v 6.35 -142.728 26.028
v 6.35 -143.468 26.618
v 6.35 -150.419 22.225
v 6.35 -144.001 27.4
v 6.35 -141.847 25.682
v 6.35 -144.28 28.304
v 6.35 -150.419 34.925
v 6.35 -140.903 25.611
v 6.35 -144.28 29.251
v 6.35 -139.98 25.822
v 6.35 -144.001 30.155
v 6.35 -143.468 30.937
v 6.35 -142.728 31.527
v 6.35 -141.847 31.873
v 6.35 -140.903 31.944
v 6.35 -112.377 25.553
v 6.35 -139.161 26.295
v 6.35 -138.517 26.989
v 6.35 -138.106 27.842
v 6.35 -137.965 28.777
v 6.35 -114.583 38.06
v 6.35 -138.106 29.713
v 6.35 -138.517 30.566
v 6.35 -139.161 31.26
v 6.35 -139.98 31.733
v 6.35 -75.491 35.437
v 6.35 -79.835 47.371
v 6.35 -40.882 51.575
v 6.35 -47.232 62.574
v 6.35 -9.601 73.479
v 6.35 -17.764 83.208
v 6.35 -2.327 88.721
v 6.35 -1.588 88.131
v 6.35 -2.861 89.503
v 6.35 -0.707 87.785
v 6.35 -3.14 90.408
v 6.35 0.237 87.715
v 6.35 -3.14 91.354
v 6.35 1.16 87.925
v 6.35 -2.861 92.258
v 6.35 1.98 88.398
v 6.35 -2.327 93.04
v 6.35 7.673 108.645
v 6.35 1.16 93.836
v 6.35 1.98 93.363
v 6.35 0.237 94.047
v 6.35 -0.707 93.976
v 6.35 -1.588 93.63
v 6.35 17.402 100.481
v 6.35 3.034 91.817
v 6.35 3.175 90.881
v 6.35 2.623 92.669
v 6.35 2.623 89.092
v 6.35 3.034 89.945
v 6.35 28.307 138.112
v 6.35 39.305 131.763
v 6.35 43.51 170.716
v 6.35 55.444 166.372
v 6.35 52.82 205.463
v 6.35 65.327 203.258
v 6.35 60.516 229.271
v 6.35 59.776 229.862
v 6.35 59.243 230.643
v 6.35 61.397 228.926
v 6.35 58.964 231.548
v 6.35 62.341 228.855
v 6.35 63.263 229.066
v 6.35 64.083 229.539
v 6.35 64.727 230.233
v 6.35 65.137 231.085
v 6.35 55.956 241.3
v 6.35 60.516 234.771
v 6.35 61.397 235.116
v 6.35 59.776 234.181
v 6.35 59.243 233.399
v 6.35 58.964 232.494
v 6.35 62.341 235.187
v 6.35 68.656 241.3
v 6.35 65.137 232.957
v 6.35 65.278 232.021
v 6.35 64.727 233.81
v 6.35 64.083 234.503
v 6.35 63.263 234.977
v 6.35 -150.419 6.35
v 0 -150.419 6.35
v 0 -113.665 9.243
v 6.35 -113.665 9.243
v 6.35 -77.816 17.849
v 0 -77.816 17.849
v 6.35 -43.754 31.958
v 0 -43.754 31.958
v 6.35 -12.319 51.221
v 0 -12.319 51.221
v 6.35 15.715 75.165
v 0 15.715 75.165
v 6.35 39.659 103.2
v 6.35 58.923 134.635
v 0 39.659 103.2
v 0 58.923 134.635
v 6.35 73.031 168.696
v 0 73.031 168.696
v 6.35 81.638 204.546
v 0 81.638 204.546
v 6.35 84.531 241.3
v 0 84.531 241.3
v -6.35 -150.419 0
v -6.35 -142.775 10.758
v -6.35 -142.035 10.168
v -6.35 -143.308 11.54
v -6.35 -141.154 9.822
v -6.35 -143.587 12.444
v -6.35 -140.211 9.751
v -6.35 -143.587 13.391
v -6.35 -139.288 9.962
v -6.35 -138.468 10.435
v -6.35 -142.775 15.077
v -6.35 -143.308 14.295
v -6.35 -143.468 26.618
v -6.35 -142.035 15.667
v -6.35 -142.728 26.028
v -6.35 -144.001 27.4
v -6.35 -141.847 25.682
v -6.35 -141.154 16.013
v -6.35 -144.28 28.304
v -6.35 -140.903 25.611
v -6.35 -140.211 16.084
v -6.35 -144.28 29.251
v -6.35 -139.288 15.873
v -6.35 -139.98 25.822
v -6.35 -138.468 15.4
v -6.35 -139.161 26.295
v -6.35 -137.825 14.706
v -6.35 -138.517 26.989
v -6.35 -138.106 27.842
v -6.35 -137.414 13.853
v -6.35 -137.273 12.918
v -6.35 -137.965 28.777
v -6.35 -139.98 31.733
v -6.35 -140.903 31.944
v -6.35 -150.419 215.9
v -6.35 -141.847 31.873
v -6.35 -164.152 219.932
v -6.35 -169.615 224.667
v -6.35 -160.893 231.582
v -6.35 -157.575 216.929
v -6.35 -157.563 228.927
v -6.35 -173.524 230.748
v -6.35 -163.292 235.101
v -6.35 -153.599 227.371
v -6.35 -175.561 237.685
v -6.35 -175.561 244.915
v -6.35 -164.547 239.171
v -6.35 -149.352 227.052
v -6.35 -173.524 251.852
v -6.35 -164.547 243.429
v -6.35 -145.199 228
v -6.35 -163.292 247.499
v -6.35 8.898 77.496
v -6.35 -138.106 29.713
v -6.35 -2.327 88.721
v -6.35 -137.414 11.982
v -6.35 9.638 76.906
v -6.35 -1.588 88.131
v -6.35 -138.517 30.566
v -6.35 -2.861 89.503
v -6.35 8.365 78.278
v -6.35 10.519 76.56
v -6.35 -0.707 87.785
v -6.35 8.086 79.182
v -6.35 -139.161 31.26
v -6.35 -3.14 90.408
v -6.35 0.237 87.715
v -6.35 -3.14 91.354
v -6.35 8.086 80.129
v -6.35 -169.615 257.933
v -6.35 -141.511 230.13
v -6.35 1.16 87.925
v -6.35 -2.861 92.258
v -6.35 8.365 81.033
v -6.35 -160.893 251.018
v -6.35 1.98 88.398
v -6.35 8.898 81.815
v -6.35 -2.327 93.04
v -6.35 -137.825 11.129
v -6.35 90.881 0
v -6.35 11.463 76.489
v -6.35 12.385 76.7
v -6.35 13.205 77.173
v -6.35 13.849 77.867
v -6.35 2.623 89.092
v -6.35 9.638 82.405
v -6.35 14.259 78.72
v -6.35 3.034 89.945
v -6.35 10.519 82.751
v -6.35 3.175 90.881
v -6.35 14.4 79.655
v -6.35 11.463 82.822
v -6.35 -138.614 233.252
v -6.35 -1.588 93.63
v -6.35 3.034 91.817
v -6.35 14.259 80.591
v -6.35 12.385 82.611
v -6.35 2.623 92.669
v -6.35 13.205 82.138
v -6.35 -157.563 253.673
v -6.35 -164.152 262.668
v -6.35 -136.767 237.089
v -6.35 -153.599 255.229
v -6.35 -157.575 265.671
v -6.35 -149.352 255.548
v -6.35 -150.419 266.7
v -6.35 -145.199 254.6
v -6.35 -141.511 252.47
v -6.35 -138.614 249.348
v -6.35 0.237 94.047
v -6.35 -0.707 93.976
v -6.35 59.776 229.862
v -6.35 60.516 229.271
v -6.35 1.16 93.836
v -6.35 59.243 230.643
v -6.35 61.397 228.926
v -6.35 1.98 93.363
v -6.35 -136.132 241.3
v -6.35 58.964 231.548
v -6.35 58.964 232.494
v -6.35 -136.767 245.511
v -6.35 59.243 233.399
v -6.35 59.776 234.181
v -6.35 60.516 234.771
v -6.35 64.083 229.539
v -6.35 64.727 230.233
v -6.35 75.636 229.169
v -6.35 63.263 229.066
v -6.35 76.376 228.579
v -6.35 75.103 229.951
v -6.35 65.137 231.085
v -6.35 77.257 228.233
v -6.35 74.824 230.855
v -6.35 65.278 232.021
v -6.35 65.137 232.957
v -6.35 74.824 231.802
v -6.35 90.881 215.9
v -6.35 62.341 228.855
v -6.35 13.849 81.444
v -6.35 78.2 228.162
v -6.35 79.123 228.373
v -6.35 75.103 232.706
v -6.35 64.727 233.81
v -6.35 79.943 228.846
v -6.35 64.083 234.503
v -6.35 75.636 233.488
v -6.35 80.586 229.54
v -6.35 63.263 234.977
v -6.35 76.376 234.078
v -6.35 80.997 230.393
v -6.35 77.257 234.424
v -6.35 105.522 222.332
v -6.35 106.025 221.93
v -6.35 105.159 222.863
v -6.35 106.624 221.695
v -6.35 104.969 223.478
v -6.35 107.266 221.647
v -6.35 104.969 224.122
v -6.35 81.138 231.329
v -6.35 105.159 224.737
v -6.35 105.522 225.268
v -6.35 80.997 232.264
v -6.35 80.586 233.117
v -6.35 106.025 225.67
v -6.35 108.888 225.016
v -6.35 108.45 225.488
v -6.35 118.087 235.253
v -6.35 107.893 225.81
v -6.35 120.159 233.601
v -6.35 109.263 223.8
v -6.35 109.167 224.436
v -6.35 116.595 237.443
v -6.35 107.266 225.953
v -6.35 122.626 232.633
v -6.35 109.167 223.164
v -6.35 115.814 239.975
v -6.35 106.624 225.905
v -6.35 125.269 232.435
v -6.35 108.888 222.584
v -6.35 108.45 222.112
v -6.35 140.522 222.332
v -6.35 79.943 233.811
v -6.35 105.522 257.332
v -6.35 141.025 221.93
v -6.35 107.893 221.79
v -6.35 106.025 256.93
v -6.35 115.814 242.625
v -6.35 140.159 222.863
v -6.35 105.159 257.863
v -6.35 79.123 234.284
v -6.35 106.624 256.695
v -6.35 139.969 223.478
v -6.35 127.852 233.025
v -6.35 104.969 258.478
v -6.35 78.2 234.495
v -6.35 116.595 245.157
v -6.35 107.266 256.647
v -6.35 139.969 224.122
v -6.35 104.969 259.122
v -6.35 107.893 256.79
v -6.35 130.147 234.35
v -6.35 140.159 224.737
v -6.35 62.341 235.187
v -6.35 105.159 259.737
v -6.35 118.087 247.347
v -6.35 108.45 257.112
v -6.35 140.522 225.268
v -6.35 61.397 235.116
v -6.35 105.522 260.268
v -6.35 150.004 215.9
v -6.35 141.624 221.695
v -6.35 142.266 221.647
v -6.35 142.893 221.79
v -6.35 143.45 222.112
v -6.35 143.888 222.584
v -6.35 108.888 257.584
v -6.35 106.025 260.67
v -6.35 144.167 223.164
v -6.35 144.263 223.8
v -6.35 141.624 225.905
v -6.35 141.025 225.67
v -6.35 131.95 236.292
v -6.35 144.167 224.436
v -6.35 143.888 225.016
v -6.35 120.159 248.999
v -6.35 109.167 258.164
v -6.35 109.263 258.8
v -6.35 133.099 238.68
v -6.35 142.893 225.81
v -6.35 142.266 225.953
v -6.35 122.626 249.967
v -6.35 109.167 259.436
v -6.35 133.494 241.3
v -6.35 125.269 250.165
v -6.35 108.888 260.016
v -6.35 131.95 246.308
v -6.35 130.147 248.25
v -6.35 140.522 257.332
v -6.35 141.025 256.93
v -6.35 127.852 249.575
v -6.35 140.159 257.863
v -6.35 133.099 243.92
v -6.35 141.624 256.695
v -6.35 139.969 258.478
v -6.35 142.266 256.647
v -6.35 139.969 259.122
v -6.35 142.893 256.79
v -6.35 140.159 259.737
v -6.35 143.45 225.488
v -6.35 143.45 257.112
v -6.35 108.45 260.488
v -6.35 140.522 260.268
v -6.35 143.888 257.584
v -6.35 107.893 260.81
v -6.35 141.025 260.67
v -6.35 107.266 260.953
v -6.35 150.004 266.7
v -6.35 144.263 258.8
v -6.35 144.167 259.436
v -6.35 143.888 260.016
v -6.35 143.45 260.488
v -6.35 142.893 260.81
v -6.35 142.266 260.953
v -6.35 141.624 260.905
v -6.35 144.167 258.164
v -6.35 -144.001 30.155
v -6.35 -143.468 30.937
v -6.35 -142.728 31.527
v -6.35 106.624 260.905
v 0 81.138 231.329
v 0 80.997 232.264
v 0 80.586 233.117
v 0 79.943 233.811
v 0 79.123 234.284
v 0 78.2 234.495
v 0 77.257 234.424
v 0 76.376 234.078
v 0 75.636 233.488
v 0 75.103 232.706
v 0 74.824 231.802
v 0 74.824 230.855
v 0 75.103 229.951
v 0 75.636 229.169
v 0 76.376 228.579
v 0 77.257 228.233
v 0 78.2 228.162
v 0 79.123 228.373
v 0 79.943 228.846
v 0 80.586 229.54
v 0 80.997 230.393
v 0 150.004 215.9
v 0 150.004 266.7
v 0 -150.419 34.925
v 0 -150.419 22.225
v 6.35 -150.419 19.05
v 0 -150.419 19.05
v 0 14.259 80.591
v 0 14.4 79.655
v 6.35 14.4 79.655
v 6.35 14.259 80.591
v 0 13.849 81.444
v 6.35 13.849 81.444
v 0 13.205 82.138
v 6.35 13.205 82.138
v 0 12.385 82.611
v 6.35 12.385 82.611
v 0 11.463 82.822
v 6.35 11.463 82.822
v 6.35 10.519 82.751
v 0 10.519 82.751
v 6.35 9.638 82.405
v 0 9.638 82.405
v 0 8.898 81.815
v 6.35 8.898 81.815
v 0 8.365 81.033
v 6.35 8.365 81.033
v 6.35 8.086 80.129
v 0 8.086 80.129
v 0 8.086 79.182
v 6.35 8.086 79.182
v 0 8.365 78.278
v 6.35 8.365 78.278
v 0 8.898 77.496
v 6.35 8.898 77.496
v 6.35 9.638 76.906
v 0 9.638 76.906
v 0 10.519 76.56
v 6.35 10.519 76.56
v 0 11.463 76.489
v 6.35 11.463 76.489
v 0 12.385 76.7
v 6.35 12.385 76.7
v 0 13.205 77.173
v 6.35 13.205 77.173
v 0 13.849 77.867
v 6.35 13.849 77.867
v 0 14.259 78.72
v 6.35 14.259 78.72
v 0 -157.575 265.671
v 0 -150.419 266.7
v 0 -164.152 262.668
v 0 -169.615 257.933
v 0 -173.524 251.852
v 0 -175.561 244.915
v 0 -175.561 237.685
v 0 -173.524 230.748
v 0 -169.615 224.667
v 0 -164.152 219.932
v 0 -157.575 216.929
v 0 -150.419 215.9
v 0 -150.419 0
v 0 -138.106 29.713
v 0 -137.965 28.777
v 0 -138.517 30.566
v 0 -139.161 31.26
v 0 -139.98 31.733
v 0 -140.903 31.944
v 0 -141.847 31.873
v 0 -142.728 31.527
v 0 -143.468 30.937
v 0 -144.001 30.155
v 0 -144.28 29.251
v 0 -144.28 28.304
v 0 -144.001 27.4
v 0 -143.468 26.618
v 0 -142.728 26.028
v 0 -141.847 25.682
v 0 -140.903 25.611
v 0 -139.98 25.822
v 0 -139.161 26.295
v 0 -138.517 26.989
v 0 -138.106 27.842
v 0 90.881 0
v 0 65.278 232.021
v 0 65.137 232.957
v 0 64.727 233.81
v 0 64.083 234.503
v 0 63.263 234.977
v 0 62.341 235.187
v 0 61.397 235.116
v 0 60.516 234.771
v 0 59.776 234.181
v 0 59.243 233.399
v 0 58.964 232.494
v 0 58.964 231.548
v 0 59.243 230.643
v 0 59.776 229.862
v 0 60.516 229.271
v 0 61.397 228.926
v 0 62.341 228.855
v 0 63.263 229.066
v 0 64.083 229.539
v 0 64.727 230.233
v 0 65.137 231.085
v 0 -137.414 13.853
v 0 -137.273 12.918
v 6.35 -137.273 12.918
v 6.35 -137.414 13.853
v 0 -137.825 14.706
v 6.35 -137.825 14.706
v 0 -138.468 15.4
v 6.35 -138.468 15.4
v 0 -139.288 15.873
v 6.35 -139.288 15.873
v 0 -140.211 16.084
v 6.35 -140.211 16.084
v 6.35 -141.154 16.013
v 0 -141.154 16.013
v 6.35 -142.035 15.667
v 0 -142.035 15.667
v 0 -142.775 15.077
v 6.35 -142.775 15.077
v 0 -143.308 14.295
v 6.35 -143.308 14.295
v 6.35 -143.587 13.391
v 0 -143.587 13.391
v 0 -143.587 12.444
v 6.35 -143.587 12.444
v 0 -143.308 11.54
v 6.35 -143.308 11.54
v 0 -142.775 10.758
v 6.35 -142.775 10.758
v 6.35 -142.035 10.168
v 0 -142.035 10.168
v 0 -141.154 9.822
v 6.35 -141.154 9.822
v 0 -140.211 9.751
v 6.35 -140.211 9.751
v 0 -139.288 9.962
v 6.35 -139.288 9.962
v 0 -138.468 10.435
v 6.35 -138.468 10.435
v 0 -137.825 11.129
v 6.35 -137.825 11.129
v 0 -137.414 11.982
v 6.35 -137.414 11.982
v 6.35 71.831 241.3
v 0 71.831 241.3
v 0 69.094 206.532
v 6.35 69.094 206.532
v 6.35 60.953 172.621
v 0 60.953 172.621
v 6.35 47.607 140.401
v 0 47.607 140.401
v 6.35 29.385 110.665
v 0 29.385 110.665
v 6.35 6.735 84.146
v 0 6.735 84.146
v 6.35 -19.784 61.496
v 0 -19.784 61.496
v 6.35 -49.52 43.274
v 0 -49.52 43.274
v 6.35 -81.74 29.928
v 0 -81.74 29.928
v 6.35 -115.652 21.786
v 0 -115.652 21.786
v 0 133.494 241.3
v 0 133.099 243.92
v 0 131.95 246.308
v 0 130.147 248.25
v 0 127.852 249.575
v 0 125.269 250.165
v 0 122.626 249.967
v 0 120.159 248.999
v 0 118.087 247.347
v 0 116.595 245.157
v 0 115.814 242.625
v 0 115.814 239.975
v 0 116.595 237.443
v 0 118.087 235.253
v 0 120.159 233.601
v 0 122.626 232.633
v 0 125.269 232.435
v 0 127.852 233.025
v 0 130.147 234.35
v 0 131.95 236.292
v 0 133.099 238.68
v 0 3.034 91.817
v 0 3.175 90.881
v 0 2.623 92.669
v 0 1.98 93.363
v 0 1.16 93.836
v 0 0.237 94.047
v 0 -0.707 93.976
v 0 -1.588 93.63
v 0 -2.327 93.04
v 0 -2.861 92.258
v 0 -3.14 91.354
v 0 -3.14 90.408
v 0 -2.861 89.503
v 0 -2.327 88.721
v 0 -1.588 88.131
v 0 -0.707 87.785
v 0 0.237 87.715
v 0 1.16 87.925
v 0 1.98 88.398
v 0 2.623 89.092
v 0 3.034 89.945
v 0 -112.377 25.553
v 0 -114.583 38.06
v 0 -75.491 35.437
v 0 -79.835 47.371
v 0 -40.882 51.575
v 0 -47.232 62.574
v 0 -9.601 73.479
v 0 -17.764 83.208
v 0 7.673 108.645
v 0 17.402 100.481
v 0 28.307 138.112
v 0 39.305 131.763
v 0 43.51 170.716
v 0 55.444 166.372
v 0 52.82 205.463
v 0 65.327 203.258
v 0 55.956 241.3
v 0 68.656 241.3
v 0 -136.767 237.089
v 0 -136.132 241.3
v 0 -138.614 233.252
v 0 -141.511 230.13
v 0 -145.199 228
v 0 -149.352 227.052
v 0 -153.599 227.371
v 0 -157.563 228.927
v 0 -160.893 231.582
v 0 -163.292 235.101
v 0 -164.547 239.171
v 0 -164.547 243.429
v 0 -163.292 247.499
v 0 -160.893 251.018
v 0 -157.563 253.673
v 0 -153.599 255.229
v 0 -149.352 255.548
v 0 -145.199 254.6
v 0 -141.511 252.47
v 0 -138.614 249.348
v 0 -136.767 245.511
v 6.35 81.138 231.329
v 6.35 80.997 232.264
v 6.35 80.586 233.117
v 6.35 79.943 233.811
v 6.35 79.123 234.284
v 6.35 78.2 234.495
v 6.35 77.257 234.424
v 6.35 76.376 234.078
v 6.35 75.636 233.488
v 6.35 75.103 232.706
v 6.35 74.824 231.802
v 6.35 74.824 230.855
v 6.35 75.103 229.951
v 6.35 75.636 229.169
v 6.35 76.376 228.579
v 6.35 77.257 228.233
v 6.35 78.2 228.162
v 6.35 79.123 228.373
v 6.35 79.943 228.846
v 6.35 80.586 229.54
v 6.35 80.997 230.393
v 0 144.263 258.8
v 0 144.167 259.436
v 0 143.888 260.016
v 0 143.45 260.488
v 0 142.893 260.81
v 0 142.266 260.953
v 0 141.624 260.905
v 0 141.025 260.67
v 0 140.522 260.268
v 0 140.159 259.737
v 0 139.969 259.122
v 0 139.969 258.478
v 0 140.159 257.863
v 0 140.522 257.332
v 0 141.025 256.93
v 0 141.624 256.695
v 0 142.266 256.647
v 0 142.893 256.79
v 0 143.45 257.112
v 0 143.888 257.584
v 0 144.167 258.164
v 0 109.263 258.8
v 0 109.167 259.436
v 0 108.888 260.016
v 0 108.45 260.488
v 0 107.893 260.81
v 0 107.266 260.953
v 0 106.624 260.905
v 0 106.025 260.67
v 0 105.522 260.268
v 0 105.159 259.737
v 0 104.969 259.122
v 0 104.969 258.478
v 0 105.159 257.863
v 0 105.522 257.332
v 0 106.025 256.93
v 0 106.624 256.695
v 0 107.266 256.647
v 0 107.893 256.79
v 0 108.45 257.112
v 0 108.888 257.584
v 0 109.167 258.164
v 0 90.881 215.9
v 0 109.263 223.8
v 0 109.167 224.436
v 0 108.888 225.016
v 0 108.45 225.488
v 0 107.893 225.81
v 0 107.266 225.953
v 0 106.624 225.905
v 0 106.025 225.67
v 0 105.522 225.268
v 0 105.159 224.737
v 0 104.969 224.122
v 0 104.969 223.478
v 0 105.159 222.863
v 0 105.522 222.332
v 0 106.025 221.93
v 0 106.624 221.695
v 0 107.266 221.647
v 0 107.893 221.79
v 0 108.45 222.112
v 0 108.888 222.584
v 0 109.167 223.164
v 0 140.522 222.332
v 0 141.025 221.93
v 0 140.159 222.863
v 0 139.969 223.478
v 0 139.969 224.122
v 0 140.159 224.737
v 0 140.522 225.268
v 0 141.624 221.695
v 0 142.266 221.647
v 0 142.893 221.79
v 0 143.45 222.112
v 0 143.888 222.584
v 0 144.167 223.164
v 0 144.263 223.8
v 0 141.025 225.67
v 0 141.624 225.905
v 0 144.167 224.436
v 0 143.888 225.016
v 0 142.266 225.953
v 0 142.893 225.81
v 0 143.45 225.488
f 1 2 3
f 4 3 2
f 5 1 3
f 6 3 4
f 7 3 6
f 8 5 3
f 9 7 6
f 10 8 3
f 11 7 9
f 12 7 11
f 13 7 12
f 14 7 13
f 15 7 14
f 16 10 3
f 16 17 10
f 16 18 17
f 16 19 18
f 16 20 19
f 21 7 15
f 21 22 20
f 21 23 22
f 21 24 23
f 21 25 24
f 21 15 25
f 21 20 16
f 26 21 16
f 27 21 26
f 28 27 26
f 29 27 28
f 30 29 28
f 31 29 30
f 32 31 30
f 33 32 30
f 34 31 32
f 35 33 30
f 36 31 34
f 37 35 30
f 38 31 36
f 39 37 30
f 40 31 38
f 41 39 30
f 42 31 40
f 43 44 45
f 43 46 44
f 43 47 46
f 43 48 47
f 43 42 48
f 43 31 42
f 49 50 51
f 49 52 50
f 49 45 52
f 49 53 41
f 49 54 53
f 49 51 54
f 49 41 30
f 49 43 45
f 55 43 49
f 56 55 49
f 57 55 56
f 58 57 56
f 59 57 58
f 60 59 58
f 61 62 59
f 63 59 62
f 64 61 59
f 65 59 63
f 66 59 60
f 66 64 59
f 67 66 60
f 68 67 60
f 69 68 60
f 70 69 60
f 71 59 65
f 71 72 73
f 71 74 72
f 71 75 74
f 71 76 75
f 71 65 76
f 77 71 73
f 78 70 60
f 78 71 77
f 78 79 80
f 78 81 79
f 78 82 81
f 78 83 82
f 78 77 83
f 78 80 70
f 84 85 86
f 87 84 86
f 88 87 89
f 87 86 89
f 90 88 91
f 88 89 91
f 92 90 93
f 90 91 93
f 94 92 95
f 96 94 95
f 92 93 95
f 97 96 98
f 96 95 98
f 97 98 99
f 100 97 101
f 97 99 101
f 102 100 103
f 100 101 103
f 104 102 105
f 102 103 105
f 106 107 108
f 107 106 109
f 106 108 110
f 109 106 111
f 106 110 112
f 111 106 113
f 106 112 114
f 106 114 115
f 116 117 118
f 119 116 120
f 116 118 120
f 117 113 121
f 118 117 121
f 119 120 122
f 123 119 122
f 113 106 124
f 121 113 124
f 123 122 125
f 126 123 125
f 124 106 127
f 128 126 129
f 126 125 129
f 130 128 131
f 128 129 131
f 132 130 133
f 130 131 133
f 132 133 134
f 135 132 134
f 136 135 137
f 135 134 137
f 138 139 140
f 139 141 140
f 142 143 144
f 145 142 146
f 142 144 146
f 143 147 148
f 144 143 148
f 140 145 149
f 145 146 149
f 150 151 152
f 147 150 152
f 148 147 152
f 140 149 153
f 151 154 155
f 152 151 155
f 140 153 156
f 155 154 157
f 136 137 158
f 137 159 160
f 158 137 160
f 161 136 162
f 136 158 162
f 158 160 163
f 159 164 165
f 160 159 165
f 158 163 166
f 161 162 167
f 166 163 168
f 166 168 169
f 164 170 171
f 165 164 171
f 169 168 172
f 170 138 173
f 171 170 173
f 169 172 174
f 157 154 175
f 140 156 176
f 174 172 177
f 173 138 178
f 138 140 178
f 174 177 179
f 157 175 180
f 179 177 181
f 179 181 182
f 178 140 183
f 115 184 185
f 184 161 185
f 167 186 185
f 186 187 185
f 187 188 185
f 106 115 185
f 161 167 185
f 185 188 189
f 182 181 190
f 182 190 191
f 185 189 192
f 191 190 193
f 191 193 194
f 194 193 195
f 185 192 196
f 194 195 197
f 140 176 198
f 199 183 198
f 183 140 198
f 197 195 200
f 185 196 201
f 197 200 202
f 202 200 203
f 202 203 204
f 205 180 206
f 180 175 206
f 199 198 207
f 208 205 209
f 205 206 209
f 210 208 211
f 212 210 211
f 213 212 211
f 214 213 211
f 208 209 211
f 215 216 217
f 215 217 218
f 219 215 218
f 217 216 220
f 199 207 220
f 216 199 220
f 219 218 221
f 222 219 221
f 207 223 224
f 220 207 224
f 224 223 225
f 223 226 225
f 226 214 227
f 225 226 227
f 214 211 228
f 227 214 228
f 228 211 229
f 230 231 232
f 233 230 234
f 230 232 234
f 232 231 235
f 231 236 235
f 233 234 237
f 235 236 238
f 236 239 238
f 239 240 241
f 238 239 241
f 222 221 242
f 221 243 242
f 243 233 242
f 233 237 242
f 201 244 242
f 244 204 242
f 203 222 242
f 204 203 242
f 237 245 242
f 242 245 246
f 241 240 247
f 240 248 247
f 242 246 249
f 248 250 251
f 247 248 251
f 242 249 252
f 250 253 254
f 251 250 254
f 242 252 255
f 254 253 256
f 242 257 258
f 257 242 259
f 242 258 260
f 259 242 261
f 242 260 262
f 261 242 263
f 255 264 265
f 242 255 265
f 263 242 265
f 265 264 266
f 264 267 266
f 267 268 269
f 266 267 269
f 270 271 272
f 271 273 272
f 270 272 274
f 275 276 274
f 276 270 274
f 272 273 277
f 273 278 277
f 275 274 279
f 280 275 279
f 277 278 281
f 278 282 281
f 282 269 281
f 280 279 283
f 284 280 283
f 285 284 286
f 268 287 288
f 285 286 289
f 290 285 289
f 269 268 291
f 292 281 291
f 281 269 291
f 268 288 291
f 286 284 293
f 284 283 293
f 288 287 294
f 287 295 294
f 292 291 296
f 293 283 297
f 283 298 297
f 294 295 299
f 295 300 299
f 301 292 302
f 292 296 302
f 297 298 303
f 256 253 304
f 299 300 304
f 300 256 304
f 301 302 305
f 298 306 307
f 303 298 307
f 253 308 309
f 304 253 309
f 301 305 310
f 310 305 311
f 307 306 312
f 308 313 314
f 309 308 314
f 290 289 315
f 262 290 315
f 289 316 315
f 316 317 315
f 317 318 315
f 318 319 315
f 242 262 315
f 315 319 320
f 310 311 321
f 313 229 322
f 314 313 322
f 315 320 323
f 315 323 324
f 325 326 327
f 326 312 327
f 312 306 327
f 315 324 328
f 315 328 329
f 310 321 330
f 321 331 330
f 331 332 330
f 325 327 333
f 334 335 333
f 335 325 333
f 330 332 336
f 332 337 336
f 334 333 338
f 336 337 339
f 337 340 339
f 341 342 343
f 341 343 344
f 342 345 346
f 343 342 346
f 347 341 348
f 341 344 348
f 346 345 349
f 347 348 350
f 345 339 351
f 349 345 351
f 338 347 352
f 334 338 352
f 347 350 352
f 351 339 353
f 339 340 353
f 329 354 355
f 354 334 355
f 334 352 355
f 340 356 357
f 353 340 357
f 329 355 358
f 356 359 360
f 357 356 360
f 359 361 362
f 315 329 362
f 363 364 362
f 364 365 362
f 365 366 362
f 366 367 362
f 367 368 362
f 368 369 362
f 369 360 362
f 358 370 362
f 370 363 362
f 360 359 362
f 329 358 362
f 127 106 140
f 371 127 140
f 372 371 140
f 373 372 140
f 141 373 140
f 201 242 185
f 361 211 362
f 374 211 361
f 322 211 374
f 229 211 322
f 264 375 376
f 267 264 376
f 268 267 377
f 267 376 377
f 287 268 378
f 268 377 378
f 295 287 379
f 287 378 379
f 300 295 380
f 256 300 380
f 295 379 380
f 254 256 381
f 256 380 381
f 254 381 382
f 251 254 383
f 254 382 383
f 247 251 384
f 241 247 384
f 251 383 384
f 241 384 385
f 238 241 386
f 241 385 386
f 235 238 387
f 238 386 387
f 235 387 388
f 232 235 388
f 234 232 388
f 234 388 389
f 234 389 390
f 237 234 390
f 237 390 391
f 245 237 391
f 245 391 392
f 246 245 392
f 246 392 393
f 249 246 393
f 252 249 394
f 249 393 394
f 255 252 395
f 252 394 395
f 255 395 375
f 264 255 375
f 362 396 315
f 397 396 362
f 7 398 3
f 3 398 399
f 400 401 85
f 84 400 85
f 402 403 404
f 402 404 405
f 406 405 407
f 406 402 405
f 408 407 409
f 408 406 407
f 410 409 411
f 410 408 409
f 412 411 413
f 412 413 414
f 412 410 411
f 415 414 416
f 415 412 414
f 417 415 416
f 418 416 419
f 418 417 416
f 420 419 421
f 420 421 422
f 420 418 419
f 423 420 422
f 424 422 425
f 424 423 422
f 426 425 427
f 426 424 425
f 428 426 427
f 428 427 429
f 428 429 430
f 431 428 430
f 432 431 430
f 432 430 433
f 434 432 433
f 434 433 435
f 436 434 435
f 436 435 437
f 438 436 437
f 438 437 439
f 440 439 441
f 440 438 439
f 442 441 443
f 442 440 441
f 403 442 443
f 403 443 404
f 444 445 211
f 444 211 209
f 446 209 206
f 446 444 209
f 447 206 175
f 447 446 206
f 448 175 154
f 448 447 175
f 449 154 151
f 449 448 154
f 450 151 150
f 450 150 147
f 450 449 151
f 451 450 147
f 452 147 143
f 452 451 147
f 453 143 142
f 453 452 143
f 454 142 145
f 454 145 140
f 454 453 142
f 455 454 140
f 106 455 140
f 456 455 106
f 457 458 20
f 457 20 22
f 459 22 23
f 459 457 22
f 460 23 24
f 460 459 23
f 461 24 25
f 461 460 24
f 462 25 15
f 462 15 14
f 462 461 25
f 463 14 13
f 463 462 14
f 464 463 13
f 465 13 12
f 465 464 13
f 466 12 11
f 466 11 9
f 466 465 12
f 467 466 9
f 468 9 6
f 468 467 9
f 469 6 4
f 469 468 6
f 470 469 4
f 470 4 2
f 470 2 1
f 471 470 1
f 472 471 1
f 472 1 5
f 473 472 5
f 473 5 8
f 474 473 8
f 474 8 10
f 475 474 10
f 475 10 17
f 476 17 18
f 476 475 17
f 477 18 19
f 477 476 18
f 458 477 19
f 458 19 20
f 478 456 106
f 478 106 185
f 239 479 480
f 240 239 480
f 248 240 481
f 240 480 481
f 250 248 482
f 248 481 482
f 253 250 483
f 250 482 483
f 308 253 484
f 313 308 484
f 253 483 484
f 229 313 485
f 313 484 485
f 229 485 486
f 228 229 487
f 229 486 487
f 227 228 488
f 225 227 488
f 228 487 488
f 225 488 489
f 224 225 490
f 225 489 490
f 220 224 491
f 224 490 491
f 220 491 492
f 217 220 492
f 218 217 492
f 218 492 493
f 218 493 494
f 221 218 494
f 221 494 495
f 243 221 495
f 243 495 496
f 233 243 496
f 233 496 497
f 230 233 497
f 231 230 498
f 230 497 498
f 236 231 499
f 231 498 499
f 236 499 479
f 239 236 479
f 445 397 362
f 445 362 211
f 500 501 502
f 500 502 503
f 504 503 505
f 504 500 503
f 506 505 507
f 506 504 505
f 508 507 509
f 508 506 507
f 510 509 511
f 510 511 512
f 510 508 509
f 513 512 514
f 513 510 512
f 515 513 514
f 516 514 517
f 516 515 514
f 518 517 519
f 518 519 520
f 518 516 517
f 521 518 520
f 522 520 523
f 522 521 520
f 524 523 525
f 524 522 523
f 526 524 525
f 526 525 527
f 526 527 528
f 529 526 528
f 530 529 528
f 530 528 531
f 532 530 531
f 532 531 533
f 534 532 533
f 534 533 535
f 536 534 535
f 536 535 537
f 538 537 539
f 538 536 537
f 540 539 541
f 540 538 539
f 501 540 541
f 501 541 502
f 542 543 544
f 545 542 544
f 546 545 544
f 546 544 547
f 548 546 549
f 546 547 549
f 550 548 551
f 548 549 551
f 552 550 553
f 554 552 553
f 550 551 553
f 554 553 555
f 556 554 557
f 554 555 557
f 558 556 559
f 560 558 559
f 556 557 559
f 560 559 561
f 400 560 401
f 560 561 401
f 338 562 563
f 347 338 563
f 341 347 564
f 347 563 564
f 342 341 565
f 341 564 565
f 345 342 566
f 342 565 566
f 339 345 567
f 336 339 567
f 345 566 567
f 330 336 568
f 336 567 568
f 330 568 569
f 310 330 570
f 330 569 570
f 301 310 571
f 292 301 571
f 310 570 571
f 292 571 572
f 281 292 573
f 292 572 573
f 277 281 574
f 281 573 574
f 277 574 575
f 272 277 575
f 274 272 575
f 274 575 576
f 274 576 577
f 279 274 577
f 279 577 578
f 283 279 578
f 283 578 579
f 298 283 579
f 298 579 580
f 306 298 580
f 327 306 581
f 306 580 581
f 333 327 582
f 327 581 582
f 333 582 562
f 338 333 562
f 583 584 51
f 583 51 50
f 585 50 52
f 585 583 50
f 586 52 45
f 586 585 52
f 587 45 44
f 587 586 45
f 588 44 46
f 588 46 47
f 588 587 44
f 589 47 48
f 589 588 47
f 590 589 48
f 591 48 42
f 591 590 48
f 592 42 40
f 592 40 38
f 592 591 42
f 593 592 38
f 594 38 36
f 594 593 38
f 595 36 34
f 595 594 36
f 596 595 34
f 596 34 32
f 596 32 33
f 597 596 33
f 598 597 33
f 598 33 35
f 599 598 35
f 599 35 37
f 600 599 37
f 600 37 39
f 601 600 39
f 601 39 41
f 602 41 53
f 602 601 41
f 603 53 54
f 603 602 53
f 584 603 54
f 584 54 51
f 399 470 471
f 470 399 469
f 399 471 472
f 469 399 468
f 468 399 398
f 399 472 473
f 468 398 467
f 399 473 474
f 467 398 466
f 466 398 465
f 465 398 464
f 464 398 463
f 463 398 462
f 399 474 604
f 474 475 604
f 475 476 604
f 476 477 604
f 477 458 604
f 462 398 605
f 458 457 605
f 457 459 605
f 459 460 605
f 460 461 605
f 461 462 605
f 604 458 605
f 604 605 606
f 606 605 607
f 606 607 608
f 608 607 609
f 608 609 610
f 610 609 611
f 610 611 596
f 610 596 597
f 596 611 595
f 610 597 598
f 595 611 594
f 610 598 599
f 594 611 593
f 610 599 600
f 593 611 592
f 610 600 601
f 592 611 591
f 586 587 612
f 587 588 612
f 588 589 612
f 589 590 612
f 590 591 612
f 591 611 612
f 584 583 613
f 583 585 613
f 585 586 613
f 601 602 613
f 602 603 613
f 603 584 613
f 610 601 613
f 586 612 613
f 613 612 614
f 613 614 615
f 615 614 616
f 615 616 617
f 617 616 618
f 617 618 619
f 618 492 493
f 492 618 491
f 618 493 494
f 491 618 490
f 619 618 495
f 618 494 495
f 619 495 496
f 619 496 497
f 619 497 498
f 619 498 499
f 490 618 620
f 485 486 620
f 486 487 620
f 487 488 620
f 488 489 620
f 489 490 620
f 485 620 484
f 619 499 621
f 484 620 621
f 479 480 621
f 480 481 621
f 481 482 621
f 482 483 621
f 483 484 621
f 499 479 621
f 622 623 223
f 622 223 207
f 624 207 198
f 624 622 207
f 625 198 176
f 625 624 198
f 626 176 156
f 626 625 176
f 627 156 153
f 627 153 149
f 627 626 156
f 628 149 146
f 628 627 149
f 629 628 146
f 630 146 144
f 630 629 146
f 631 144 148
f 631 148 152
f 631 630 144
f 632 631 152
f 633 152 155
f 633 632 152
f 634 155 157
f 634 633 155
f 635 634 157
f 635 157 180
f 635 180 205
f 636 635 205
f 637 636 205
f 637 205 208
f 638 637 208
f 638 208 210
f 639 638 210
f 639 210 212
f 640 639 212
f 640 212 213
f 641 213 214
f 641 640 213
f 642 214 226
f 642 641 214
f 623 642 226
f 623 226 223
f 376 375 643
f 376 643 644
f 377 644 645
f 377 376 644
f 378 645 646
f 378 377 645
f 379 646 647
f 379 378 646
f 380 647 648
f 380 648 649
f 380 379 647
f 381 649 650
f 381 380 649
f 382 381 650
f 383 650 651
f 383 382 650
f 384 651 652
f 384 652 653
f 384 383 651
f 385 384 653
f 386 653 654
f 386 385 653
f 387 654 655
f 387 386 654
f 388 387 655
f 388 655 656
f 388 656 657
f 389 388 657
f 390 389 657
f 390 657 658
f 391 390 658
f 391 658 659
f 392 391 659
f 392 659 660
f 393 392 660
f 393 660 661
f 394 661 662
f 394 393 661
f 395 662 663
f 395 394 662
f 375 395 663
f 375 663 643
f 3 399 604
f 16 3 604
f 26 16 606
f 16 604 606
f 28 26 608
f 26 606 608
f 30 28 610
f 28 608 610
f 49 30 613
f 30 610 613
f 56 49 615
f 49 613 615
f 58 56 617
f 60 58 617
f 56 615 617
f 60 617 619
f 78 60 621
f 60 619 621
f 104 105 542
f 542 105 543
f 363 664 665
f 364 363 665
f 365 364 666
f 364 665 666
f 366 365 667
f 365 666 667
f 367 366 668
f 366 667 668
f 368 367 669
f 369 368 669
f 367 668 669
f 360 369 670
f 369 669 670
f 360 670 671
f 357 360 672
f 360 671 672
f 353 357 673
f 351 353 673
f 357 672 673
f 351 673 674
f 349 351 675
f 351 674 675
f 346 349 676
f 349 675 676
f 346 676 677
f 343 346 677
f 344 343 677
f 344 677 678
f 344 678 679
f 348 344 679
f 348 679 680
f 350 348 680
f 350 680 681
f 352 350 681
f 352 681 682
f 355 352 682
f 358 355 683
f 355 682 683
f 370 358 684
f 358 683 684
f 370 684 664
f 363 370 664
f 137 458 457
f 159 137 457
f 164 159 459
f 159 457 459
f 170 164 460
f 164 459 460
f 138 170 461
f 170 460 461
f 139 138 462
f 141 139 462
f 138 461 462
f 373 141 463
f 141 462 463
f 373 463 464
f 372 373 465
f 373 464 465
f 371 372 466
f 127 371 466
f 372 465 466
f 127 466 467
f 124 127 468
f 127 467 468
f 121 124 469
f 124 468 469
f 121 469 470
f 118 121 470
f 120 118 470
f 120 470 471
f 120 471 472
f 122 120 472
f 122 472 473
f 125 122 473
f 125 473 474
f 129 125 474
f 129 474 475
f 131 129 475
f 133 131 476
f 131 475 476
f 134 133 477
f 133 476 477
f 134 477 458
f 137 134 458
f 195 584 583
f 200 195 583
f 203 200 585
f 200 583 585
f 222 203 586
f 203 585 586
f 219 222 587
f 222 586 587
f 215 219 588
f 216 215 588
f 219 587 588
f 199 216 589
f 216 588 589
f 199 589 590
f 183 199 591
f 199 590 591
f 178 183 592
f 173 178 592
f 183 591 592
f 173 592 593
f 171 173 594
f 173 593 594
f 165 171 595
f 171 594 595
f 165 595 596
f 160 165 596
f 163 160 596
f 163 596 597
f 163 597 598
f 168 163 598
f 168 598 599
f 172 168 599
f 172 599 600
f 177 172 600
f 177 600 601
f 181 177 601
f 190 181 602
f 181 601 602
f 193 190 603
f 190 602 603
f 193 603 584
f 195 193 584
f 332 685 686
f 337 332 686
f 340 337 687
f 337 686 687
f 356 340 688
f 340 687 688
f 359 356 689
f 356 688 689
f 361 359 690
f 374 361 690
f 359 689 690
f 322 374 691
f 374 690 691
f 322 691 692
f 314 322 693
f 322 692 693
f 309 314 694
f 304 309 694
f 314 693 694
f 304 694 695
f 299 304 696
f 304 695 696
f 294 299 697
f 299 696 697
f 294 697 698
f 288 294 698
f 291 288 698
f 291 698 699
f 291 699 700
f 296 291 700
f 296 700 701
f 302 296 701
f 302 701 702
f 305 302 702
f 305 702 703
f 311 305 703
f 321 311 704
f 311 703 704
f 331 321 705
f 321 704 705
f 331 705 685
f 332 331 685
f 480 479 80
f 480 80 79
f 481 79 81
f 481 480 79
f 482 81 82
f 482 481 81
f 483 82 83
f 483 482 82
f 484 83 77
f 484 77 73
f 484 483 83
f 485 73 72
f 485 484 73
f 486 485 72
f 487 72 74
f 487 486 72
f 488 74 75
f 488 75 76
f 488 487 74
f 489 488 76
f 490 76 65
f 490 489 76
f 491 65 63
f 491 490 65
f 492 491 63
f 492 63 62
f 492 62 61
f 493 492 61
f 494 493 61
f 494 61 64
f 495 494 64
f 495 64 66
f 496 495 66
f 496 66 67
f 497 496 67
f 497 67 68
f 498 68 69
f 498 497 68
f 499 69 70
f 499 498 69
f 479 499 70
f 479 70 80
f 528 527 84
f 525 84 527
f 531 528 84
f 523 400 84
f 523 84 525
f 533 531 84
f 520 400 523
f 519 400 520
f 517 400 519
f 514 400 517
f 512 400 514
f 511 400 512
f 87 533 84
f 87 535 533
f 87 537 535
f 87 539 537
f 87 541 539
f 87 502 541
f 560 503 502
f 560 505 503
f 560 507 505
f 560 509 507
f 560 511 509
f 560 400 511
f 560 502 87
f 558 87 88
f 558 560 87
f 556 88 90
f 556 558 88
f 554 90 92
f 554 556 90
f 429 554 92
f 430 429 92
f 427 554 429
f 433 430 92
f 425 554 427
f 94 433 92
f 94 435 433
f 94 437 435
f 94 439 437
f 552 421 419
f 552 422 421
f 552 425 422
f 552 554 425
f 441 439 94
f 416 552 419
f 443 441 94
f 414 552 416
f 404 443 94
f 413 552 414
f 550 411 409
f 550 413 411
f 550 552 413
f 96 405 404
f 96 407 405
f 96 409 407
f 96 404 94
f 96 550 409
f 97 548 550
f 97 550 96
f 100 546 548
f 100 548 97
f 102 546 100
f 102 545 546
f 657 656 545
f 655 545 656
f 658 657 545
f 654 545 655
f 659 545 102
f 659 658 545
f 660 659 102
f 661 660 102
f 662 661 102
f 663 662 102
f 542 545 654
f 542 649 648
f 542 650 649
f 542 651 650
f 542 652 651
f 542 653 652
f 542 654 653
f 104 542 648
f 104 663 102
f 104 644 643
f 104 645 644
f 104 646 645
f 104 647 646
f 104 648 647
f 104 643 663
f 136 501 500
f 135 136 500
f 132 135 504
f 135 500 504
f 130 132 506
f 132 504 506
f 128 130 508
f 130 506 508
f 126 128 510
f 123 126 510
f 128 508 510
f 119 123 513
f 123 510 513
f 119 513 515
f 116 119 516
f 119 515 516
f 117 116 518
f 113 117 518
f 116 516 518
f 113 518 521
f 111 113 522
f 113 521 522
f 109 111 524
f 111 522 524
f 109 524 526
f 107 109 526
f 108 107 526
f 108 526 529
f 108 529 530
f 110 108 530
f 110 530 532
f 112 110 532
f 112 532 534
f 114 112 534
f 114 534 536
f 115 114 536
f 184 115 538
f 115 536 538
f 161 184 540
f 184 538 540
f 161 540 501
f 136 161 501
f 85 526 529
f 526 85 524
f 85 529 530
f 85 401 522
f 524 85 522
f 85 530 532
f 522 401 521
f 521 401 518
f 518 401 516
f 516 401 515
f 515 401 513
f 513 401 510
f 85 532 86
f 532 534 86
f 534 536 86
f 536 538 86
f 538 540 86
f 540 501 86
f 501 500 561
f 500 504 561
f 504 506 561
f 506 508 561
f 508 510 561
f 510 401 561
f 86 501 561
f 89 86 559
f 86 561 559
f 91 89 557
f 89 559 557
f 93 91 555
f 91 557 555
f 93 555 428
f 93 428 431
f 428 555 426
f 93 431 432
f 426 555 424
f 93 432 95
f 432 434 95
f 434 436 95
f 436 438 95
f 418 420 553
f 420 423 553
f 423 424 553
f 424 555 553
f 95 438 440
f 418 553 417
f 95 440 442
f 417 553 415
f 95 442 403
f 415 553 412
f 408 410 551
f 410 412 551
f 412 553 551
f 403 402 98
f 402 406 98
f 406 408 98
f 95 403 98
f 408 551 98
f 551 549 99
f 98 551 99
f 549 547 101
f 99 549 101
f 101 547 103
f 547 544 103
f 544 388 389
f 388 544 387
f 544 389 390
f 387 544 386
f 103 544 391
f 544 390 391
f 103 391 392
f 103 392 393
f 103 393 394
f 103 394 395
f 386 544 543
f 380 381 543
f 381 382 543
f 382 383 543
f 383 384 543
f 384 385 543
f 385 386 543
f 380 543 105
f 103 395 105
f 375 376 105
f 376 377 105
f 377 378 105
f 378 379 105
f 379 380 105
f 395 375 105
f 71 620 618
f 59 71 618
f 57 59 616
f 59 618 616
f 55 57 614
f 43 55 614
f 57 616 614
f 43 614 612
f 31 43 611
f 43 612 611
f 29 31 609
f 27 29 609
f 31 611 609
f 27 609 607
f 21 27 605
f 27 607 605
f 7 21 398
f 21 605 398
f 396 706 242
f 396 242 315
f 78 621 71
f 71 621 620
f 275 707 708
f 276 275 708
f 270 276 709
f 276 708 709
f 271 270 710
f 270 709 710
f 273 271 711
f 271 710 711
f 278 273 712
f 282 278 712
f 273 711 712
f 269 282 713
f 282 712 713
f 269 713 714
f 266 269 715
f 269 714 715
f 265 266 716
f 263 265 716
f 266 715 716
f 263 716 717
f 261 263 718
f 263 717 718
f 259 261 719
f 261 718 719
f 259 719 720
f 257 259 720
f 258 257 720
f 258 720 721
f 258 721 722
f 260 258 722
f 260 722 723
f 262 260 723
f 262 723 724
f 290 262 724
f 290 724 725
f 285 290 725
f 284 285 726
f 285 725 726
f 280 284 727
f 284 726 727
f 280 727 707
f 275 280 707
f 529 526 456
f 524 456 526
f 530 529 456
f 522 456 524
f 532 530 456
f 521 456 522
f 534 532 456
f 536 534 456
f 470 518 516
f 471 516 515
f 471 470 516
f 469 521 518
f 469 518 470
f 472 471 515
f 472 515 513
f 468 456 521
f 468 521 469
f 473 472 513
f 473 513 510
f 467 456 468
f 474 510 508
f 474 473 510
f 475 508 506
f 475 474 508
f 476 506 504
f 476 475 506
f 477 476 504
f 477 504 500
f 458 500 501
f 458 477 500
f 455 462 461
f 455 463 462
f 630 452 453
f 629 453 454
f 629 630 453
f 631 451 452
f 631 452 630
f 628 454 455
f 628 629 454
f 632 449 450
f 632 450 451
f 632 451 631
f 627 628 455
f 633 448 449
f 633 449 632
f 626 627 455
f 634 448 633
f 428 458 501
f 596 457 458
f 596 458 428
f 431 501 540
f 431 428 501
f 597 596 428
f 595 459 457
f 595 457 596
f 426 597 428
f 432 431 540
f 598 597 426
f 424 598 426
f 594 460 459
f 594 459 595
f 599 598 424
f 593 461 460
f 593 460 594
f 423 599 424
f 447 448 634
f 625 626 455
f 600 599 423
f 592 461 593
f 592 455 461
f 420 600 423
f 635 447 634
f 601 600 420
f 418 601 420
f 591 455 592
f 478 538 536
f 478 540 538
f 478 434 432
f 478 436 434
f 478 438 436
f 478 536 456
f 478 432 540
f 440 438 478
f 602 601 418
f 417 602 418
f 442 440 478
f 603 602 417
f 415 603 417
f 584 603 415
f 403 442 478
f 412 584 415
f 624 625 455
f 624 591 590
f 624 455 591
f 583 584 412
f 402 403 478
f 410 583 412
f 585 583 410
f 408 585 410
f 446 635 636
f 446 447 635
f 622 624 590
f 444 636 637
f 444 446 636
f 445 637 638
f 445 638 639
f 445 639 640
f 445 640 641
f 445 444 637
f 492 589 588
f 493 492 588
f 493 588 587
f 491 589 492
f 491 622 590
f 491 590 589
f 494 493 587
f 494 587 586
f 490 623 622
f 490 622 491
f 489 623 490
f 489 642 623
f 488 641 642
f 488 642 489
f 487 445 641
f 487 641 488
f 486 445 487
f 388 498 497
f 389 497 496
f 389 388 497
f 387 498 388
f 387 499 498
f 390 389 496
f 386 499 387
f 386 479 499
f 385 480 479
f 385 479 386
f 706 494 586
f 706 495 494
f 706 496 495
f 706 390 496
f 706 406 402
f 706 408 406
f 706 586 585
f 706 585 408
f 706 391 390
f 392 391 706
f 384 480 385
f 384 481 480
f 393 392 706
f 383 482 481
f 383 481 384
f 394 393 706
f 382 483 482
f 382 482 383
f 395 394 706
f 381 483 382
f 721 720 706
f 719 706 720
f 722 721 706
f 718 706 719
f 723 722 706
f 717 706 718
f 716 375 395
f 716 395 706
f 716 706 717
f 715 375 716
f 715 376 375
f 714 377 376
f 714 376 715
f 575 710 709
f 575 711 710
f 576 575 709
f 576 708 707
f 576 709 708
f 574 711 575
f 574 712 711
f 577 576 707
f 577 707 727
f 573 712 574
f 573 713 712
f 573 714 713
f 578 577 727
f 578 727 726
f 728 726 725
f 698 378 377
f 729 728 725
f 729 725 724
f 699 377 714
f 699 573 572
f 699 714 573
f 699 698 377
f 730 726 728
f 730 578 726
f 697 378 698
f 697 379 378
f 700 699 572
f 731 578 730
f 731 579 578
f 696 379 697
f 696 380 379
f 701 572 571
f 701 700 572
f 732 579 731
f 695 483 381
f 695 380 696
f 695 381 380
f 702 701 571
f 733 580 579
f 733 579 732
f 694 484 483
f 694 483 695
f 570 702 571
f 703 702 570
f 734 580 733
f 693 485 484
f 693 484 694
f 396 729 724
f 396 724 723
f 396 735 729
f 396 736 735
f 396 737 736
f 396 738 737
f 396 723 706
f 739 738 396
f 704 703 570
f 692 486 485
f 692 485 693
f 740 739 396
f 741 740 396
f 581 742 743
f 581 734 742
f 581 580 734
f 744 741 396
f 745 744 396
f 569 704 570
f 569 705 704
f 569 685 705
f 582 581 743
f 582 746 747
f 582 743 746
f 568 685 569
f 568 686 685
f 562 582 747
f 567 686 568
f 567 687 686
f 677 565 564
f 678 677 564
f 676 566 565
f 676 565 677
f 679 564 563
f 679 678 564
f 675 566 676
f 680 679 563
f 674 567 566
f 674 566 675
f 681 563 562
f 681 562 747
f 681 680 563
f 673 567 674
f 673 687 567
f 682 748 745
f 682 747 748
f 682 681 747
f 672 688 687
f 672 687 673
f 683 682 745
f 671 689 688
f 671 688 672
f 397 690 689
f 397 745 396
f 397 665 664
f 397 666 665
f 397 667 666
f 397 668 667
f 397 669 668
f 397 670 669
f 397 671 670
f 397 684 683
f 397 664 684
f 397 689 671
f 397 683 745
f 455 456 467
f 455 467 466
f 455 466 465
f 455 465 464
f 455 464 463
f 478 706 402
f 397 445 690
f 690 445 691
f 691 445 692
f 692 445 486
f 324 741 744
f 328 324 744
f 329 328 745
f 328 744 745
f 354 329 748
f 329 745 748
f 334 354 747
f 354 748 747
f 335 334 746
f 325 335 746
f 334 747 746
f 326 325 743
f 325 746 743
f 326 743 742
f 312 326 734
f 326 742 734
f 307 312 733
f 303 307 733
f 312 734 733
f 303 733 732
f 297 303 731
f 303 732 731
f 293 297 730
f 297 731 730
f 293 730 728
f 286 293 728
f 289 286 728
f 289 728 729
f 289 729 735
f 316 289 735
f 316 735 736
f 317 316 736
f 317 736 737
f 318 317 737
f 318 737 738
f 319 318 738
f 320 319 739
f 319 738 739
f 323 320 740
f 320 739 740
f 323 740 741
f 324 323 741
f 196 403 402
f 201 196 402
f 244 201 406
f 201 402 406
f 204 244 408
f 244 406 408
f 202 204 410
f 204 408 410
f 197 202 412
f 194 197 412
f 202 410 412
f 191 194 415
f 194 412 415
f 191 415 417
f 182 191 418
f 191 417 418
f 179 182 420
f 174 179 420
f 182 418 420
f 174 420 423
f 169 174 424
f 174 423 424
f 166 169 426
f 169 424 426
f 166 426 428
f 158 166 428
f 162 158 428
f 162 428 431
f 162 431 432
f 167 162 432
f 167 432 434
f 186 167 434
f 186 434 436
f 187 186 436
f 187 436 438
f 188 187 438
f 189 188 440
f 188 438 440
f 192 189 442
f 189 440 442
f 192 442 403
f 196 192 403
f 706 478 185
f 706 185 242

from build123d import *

# Parameters (mm, degrees)
F0_R     = 2.159
F0_R_2   = 8.89
F0_R_3   = 3.175
F1_DEPTH = 6.35
F2_DEPTH = 6.35
F3_DEPTH = 6.35


with BuildPart() as f1:
    # F0 (on Right) → F1 (new body)
    with BuildSketch(Plane.YZ):
        with BuildLine():
            Line((-136.1317900279, 241.3), (-125.0192900279, 241.3))
            ThreePointArc((-125.0192900279, 241.3), (-132.4587777858, 259.2605122421), (-150.4192900279, 266.7))
            ThreePointArc((-150.4192900279, 266.7), (-175.8192900279, 241.3), (-150.4192900279, 215.9))
            Line((-150.4192900279, 215.9), (-150.4192900279, 227.0125))
            ThreePointArc((-150.4192900279, 227.0125), (-160.5220781641, 251.4027881362), (-136.1317900279, 241.3))
        make_face()
        with BuildLine():
            ThreePointArc((-150.4192900279, 215.9), (-132.4587777858, 223.3394877579), (-125.0192900279, 241.3))
            Line((-125.0192900279, 241.3), (-136.1317900279, 241.3))
            ThreePointArc((-136.1317900279, 241.3), (-140.3165018917, 231.1972118638), (-150.4192900279, 227.0125))
            Line((-150.4192900279, 227.0125), (-150.4192900279, 215.9))
        make_face()
        with BuildLine():
            ThreePointArc((-150.4192900279, 266.7), (-132.4587777858, 259.2605122421), (-125.0192900279, 241.3))
            Line((-125.0192900279, 241.3), (55.9557099721, 241.3))
            Line((55.9557099721, 241.3), (68.6557099721, 241.3))
            Line((68.6557099721, 241.3), (71.8307099721, 241.3))
            Line((71.8307099721, 241.3), (84.5307099721, 241.3))
            Line((84.5307099721, 241.3), (90.8807099721, 241.3))
            Line((90.8807099721, 241.3), (90.8807099721, 266.7))
            Line((90.8807099721, 266.7), (-150.4192900279, 266.7))
        make_face()
        Polygon((150.0042899721, 266.7), (90.8807099721, 266.7), (90.8807099721, 241.3), (90.8807099721, 215.9), (150.0042899721, 215.9), align=None)
        with Locations((107.1042899721, 223.8)):
            Circle(F0_R, mode=Mode.SUBTRACT)
        with Locations((142.1042899721, 223.8)):
            Circle(F0_R, mode=Mode.SUBTRACT)
        with Locations((107.1042899721, 258.8)):
            Circle(F0_R, mode=Mode.SUBTRACT)
        with Locations((124.6042899721, 241.3)):
            Circle(F0_R_2, mode=Mode.SUBTRACT)
        with Locations((142.1042899721, 258.8)):
            Circle(F0_R, mode=Mode.SUBTRACT)
        with BuildLine():
            Line((90.8807099721, 215.9), (90.8807099721, 241.3))
            Line((90.8807099721, 241.3), (84.5307099721, 241.3))
            ThreePointArc((84.5307099721, 241.3), (15.7154482119, 75.1652617602), (-150.4192900279, 6.35))
            Line((-150.4192900279, 6.35), (-150.4192900279, 0))
            Line((-150.4192900279, 0), (90.8807099721, 0))
            Line((90.8807099721, 0), (90.8807099721, 215.9))
        make_face()
        with BuildLine():
            Line((84.5307099721, 241.3), (71.8307099721, 241.3))
            ThreePointArc((71.8307099721, 241.3), (6.7351920908, 84.1455178813), (-150.4192900279, 19.05))
            Line((-150.4192900279, 19.05), (-150.4192900279, 6.35))
            ThreePointArc((-150.4192900279, 6.35), (15.7154482119, 75.1652617602), (84.5307099721, 241.3))
        make_face()
        with Locations((-140.4478980762, 12.9175765464)):
            Circle(F0_R_3, mode=Mode.SUBTRACT)
        with Locations((11.2253201513, 79.6553898208)):
            Circle(F0_R_3, mode=Mode.SUBTRACT)
        with Locations((77.9631334257, 231.3286080483)):
            Circle(F0_R_3, mode=Mode.SUBTRACT)
        with BuildLine():
            Line((71.8307099721, 241.3), (68.6557099721, 241.3))
            ThreePointArc((68.6557099721, 241.3), (4.4901280605, 86.3905819116), (-150.4192900279, 22.225))
            Line((-150.4192900279, 22.225), (-150.4192900279, 19.05))
            ThreePointArc((-150.4192900279, 19.05), (6.7351920908, 84.1455178813), (71.8307099721, 241.3))
        make_face()
        with BuildLine():
            Line((68.6557099721, 241.3), (55.9557099721, 241.3))
            ThreePointArc((55.9557099721, 241.3), (-4.4901280605, 95.3708380326), (-150.4192900279, 34.925))
            Line((-150.4192900279, 34.925), (-150.4192900279, 22.225))
            ThreePointArc((-150.4192900279, 22.225), (4.4901280605, 86.3905819116), (68.6557099721, 241.3))
        make_face()
        with Locations((-141.1403558506, 28.777467064)):
            Circle(F0_R_3, mode=Mode.SUBTRACT)
        with Locations((0, 90.8807099721)):
            Circle(F0_R_3, mode=Mode.SUBTRACT)
        with Locations((62.1032429081, 232.0210658227)):
            Circle(F0_R_3, mode=Mode.SUBTRACT)
        with BuildLine():
            Line((55.9557099721, 241.3), (-125.0192900279, 241.3))
            ThreePointArc((-125.0192900279, 241.3), (-132.4587777858, 223.3394877579), (-150.4192900279, 215.9))
            Line((-150.4192900279, 215.9), (-150.4192900279, 34.925))
            ThreePointArc((-150.4192900279, 34.925), (-4.4901280605, 95.3708380326), (55.9557099721, 241.3))
        make_face()
    extrude(amount=-F1_DEPTH)


with BuildPart() as f2:
    # F0 (on Right) → F2 (new body)
    with BuildSketch(Plane.YZ):
        with BuildLine():
            Line((68.6557099721, 241.3), (55.9557099721, 241.3))
            ThreePointArc((55.9557099721, 241.3), (-4.4901280605, 95.3708380326), (-150.4192900279, 34.925))
            Line((-150.4192900279, 34.925), (-150.4192900279, 22.225))
            ThreePointArc((-150.4192900279, 22.225), (4.4901280605, 86.3905819116), (68.6557099721, 241.3))
        make_face()
        with Locations((-141.1403558506, 28.777467064)):
            Circle(F0_R_3, mode=Mode.SUBTRACT)
        with Locations((0, 90.8807099721)):
            Circle(F0_R_3, mode=Mode.SUBTRACT)
        with Locations((62.1032429081, 232.0210658227)):
            Circle(F0_R_3, mode=Mode.SUBTRACT)
    extrude(amount=F2_DEPTH)


with BuildPart() as f3:
    # F0 (on Right) → F3 (new body)
    with BuildSketch(Plane.YZ):
        with BuildLine():
            Line((84.5307099721, 241.3), (71.8307099721, 241.3))
            ThreePointArc((71.8307099721, 241.3), (6.7351920908, 84.1455178813), (-150.4192900279, 19.05))
            Line((-150.4192900279, 19.05), (-150.4192900279, 6.35))
            ThreePointArc((-150.4192900279, 6.35), (15.7154482119, 75.1652617602), (84.5307099721, 241.3))
        make_face()
        with Locations((-140.4478980762, 12.9175765464)):
            Circle(F0_R_3, mode=Mode.SUBTRACT)
        with Locations((11.2253201513, 79.6553898208)):
            Circle(F0_R_3, mode=Mode.SUBTRACT)
        with Locations((77.9631334257, 231.3286080483)):
            Circle(F0_R_3, mode=Mode.SUBTRACT)
    extrude(amount=F3_DEPTH)


solid = Compound([f1.part, f2.part, f3.part])
